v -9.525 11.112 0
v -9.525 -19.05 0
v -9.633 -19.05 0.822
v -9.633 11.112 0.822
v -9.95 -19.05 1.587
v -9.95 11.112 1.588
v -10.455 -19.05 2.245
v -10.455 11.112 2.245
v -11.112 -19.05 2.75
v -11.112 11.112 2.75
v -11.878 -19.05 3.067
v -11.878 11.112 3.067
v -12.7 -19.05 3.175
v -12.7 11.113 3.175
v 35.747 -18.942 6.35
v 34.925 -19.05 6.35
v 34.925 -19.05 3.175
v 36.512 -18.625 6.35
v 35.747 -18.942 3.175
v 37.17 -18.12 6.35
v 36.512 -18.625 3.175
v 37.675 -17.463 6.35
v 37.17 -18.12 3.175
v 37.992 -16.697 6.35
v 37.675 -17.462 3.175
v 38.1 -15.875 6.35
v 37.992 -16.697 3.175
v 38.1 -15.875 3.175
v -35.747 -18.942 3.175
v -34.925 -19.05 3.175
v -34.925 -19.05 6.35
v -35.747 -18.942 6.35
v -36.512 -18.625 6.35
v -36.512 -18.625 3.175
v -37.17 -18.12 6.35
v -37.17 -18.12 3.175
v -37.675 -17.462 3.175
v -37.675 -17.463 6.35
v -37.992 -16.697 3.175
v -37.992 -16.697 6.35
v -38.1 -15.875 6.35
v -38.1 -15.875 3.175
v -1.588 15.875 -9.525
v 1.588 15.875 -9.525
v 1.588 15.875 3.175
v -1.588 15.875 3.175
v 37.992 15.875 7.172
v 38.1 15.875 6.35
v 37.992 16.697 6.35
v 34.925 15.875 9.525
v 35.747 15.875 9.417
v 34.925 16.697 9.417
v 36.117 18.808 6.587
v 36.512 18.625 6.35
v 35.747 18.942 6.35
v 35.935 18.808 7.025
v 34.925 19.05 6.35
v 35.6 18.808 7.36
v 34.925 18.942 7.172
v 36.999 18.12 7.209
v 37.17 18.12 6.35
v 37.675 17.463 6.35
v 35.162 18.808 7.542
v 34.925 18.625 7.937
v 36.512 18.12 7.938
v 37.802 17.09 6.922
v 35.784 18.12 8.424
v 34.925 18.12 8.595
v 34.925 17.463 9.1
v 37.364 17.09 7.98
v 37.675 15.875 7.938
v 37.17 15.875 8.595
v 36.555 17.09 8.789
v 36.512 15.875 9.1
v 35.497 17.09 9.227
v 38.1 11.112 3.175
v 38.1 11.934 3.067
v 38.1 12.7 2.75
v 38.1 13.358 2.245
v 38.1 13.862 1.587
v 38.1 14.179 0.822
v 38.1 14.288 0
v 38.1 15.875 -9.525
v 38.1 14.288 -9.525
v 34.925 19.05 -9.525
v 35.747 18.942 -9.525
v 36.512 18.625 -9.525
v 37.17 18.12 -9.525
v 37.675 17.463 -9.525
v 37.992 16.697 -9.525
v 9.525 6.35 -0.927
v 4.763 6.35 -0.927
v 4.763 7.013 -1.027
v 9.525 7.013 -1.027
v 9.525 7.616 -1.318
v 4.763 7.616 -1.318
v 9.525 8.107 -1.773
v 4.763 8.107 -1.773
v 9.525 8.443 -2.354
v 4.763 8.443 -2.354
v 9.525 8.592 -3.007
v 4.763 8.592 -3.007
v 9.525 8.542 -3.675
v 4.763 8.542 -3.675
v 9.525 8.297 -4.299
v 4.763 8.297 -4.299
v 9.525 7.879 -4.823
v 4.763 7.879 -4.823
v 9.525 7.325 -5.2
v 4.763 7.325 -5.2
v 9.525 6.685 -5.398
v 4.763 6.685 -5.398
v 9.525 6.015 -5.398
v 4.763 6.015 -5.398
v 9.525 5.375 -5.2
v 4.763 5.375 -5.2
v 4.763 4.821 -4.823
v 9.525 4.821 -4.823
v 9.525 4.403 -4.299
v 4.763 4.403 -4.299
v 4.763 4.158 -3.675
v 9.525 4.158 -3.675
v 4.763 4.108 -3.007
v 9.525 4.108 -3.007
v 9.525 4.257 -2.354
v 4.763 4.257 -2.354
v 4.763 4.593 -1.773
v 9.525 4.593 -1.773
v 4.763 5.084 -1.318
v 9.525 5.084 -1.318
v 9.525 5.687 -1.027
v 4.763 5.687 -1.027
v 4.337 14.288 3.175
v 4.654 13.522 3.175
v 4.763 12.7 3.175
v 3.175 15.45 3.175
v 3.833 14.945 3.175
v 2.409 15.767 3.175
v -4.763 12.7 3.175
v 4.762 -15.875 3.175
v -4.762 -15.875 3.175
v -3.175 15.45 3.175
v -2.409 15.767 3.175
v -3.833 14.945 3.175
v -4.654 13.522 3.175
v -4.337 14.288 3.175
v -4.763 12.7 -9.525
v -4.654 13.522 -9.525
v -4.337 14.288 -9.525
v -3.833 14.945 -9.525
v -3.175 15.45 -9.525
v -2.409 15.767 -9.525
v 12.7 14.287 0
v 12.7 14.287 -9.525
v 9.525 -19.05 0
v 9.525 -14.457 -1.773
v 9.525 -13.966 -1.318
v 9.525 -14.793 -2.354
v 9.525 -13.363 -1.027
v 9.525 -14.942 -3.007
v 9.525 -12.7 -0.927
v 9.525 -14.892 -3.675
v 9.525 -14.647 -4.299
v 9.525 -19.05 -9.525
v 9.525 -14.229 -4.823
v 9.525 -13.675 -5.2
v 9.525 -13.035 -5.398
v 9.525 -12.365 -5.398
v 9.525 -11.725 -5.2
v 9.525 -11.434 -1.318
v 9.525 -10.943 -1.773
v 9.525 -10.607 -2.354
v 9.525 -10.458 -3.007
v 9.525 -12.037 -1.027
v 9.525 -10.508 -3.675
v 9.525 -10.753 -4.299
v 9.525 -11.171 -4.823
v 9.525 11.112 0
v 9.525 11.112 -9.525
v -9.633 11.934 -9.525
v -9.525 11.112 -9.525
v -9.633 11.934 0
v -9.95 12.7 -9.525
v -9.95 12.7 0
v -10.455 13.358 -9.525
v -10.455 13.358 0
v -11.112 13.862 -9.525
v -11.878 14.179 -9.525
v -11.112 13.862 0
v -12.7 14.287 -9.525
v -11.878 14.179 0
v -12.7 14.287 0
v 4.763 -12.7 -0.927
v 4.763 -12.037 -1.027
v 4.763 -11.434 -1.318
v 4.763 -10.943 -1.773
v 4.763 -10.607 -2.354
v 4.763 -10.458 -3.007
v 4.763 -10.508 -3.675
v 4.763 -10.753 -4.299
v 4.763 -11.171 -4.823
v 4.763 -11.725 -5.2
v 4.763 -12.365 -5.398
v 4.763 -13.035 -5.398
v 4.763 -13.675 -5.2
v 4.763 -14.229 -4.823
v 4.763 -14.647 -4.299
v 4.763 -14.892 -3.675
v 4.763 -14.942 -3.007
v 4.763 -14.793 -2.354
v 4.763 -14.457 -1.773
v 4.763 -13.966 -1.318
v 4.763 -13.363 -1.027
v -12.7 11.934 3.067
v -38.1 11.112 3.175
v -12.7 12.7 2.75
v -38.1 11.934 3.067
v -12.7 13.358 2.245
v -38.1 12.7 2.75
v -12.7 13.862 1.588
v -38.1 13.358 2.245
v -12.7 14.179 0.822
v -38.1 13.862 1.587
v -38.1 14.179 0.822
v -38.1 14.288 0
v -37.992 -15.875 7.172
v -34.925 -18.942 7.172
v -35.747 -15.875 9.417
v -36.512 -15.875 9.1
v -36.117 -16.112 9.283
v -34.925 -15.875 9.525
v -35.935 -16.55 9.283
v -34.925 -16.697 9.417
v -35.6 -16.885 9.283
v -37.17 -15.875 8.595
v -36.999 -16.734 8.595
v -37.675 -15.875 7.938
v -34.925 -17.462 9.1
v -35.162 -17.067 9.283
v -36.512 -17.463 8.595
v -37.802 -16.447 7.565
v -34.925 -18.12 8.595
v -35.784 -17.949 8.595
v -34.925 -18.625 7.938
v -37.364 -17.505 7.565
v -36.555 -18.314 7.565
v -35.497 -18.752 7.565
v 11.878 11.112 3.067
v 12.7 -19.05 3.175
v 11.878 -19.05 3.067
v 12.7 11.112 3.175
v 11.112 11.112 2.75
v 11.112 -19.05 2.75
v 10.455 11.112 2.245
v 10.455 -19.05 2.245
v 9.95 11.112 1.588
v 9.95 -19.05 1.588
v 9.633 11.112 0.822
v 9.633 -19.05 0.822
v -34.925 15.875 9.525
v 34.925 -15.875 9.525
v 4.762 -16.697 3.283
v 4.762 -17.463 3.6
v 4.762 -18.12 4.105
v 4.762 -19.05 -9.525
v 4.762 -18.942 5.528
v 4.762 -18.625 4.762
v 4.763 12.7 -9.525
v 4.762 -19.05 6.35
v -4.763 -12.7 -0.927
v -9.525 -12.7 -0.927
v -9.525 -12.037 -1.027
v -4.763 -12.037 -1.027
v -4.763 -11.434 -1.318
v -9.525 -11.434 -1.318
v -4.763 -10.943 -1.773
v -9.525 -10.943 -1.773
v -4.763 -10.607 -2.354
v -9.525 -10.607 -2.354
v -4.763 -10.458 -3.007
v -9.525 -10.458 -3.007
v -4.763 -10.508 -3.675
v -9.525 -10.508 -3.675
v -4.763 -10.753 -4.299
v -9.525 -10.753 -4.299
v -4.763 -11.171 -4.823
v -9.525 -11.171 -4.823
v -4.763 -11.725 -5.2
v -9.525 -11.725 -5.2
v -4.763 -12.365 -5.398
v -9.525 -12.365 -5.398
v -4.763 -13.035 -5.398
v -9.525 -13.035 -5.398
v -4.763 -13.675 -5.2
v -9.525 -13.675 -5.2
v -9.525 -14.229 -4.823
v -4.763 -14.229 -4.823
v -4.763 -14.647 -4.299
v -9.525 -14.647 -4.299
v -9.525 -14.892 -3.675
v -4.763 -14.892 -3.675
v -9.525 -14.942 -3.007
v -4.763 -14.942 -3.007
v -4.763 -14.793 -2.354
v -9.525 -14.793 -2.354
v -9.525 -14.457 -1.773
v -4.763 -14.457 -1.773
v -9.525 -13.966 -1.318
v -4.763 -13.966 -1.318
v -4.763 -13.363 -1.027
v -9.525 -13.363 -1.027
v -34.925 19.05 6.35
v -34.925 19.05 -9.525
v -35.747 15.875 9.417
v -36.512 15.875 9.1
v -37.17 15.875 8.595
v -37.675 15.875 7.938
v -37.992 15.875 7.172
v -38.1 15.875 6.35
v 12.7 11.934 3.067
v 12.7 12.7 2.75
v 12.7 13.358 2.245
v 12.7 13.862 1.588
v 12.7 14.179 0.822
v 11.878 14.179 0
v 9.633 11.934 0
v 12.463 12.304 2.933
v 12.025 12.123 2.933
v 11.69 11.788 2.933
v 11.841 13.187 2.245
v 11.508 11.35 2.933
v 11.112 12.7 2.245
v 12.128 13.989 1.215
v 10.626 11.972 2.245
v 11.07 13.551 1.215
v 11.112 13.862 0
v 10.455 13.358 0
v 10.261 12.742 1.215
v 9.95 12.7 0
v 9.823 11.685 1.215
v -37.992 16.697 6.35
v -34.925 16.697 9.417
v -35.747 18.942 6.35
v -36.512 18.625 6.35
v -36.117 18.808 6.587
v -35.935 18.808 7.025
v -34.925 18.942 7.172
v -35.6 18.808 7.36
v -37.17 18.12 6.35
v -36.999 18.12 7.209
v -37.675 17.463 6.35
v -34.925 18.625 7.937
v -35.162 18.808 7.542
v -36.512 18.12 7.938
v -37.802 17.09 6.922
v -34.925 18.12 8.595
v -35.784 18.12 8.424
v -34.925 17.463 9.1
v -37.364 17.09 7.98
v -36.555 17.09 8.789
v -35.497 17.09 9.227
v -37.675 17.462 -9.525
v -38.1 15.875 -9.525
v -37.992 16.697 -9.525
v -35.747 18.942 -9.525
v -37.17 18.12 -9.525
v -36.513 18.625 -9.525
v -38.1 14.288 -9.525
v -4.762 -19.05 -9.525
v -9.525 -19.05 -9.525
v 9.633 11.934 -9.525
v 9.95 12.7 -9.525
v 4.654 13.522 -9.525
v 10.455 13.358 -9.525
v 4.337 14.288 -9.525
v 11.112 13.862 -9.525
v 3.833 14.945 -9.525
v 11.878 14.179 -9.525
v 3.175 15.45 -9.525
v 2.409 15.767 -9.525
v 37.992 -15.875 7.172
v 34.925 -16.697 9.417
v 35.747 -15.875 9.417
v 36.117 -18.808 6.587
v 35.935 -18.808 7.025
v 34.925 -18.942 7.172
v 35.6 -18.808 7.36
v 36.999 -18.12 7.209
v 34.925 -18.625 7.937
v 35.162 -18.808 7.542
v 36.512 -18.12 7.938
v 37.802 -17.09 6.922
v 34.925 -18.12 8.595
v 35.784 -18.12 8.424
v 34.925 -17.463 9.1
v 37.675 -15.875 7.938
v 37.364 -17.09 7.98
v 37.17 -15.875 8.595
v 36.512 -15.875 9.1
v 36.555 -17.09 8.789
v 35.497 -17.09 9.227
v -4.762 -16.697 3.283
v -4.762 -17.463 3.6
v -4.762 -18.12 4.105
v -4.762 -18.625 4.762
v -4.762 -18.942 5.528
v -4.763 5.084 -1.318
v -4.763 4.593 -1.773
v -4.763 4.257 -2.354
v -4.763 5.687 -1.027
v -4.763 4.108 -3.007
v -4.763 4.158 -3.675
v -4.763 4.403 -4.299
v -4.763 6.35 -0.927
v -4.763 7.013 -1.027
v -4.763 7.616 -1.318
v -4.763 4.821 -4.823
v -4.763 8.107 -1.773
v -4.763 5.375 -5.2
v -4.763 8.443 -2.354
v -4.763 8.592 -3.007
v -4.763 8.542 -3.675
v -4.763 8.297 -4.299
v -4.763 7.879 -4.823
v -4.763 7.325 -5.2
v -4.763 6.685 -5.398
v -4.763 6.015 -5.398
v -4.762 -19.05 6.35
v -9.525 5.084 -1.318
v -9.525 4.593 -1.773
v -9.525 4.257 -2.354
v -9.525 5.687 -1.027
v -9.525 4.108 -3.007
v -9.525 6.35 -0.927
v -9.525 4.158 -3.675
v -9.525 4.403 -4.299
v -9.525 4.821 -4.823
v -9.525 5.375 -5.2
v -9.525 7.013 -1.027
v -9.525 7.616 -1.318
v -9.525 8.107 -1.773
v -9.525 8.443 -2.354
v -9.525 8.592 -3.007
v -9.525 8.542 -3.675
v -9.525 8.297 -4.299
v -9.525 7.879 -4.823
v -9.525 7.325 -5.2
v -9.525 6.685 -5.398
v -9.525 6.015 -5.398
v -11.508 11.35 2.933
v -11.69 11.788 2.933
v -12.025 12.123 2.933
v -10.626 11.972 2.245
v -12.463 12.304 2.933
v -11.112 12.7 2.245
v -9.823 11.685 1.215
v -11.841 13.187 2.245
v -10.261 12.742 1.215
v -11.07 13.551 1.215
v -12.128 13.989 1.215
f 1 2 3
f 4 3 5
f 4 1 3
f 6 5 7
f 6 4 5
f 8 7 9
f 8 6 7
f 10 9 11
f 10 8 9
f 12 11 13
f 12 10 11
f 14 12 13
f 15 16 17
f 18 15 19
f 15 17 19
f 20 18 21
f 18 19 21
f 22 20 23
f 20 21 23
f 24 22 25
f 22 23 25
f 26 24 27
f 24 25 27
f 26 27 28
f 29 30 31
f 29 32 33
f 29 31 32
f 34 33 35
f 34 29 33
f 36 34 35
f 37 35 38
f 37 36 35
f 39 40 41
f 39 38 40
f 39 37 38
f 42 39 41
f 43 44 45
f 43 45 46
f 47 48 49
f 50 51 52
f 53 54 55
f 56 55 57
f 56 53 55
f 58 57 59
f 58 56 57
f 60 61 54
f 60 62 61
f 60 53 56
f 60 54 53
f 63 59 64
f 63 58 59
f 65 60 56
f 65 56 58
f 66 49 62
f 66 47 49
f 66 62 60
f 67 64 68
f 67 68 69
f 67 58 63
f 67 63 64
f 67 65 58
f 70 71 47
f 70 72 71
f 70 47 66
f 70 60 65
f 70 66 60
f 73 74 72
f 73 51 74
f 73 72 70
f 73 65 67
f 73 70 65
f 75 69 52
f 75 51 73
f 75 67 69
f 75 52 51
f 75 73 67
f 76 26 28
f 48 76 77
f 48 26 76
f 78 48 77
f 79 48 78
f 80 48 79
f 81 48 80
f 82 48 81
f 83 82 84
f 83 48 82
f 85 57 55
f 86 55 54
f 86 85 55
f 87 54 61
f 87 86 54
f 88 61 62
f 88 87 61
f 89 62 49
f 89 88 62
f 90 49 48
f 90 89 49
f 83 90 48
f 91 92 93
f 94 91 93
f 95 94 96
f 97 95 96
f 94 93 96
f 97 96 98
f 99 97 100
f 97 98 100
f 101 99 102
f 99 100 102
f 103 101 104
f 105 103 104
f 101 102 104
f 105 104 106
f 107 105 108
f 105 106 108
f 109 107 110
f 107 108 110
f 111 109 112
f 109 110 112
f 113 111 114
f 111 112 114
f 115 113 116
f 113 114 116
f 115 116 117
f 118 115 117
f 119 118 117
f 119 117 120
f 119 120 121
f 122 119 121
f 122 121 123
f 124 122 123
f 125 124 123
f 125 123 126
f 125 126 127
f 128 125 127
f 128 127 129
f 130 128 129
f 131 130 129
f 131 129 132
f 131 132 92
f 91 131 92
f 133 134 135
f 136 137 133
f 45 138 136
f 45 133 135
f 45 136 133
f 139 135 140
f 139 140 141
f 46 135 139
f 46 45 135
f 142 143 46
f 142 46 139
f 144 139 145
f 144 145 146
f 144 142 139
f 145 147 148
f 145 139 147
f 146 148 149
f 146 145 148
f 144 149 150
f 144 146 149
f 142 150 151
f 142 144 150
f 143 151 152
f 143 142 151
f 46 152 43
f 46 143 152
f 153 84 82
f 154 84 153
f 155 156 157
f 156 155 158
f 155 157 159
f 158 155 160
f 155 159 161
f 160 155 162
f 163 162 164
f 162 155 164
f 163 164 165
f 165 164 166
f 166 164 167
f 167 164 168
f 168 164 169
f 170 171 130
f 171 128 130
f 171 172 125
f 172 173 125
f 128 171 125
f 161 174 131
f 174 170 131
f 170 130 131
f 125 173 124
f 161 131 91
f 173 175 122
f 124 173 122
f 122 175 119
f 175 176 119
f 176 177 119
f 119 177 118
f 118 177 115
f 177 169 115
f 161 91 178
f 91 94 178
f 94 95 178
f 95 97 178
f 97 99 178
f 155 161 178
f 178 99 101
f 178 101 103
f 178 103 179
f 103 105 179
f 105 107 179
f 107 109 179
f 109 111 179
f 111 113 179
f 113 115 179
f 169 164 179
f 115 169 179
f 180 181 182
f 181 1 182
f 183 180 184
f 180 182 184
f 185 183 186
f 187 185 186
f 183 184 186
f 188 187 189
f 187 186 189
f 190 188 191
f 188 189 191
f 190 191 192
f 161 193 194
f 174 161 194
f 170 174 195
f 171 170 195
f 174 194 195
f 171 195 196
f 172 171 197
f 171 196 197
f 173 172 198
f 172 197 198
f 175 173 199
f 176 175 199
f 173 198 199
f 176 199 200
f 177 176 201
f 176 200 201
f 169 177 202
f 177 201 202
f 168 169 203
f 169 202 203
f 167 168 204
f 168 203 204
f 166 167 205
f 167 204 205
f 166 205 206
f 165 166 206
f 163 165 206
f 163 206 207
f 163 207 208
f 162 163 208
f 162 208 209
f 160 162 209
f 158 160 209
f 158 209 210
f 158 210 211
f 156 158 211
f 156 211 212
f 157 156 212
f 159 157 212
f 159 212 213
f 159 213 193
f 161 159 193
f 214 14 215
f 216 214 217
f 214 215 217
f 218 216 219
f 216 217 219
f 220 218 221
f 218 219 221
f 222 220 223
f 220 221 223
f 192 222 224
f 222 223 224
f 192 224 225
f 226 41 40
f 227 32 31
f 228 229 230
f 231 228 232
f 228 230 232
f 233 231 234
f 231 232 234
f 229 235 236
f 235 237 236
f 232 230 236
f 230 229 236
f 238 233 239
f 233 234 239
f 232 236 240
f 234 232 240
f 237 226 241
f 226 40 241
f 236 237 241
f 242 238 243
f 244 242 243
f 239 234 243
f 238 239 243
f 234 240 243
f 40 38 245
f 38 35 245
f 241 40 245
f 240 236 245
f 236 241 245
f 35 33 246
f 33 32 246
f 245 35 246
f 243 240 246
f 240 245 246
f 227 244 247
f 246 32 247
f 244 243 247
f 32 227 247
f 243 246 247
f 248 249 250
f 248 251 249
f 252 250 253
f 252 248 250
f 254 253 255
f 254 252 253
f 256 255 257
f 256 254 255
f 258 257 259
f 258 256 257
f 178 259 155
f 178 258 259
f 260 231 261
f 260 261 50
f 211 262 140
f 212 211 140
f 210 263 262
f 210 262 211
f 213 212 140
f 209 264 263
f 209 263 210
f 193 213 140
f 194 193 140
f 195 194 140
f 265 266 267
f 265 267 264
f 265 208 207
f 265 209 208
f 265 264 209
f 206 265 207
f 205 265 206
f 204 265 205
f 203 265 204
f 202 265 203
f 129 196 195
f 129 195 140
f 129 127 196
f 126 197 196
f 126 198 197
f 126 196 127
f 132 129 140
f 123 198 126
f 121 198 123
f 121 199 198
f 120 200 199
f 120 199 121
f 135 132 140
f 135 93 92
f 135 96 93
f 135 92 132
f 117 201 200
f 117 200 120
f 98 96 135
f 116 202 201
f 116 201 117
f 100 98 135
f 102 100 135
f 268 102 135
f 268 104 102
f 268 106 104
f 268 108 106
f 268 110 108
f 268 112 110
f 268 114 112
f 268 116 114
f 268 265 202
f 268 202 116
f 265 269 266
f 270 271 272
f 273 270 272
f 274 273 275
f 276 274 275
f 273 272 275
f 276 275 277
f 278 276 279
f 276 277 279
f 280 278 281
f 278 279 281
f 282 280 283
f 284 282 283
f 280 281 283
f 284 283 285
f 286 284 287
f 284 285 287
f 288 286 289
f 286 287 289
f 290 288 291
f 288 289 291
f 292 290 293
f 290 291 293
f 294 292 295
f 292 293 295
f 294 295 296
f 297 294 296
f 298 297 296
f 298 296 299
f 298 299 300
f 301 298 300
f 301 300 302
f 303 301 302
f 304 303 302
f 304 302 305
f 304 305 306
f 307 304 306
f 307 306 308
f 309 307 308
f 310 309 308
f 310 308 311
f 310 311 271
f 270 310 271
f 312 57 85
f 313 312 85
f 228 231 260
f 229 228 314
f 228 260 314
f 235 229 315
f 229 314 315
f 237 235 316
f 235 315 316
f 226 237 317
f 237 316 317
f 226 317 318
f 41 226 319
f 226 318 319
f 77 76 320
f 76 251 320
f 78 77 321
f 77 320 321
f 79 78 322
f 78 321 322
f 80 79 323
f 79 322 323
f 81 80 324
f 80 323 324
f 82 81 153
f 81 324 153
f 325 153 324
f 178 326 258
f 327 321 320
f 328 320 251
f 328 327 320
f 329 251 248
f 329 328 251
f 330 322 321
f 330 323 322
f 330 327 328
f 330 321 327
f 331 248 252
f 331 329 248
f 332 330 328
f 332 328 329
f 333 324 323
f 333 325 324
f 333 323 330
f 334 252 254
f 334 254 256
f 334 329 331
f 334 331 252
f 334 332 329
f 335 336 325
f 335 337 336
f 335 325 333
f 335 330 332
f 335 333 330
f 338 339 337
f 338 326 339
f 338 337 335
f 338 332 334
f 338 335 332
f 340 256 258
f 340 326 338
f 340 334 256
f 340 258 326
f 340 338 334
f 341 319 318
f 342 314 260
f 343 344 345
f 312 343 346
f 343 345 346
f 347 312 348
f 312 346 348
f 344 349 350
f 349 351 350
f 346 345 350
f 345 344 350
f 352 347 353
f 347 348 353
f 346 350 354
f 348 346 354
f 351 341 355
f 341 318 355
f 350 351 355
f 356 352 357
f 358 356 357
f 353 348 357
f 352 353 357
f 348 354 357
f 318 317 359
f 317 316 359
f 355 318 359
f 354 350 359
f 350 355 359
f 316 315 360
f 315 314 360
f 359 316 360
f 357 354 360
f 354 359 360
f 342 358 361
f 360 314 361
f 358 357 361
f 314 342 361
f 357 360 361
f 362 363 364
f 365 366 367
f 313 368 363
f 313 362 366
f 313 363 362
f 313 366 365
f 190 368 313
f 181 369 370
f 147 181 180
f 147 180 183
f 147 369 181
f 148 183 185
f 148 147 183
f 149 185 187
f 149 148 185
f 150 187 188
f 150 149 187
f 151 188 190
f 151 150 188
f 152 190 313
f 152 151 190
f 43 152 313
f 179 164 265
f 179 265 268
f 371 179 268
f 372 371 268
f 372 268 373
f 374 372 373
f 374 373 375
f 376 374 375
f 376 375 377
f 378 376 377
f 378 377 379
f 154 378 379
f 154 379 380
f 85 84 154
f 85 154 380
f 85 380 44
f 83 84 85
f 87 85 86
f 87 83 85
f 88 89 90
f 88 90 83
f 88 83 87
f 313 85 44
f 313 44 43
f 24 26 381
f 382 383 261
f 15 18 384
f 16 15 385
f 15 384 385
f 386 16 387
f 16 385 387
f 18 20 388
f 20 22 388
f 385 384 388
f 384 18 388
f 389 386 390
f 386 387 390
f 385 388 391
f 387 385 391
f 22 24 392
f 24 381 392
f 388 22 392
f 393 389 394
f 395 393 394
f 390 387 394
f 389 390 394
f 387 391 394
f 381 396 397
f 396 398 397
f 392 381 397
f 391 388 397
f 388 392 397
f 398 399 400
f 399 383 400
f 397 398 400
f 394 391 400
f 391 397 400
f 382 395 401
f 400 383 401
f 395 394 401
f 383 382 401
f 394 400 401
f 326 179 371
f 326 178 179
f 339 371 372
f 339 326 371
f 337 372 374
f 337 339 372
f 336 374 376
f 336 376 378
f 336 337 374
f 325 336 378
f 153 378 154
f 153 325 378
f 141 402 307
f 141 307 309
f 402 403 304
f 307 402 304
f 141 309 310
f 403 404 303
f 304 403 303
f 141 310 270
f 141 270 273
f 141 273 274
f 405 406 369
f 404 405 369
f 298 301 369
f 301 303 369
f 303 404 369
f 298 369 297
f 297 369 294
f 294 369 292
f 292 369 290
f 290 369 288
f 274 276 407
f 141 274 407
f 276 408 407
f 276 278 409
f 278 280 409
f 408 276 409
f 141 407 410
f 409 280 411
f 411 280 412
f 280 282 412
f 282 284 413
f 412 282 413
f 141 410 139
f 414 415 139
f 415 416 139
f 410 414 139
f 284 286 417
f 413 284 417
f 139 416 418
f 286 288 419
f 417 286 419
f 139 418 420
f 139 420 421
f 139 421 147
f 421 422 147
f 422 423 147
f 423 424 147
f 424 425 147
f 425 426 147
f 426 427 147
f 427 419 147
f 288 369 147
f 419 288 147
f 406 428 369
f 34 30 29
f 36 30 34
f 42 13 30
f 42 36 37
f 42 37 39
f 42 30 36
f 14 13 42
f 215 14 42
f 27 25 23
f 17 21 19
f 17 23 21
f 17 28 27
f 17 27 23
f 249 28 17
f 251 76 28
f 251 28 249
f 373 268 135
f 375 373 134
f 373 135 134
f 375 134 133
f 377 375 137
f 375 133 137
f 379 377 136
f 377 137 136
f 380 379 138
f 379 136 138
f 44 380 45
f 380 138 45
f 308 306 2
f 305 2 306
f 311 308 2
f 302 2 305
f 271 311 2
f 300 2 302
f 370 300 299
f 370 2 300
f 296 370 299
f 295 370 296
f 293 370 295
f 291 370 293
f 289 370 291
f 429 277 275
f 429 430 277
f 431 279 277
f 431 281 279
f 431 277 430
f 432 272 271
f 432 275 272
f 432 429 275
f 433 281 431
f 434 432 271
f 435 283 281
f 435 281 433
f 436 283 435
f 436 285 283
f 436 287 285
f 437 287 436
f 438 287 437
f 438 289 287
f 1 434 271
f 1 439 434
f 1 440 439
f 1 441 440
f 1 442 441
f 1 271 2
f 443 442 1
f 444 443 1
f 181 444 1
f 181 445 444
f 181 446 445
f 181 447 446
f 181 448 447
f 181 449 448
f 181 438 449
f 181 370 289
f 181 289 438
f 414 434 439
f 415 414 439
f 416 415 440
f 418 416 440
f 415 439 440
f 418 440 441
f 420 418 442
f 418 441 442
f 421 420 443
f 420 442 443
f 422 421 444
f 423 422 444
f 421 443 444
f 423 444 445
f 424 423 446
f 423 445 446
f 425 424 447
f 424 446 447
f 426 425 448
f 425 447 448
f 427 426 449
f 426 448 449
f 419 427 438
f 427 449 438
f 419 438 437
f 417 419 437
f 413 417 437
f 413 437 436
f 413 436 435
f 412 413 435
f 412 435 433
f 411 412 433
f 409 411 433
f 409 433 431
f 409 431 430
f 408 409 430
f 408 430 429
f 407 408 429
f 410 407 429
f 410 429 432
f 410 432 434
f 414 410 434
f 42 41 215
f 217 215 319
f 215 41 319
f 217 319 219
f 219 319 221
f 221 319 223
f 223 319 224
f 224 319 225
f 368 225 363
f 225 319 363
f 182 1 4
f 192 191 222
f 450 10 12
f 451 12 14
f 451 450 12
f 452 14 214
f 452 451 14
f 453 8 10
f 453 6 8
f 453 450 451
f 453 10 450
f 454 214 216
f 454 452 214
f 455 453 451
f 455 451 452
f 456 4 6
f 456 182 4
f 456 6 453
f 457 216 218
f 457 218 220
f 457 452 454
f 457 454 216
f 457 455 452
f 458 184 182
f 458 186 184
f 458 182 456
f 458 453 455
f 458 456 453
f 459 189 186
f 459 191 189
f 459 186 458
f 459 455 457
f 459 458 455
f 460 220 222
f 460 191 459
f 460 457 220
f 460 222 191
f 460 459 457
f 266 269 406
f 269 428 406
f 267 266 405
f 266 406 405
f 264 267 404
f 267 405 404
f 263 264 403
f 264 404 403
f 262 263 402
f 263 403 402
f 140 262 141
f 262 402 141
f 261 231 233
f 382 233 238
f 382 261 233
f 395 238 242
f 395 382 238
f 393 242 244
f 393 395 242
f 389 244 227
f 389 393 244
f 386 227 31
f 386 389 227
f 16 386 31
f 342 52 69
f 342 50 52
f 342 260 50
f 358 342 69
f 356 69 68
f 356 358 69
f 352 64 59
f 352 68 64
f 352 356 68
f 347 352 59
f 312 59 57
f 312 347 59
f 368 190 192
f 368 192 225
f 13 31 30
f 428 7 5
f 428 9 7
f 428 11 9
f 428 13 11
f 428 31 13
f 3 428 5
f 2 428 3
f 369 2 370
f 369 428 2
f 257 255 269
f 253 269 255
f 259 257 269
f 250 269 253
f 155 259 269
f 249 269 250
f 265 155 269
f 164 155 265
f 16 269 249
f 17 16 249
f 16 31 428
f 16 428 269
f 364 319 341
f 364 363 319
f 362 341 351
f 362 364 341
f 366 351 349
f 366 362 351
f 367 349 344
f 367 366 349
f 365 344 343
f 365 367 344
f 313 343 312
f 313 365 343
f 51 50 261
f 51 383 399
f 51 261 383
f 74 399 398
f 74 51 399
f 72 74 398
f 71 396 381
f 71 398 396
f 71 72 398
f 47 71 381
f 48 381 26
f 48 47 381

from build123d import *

# Parameters (mm, degrees)
SKETCH1_W             = 19.05
SKETCH1_H             = 38.1
BOSS_EXTRUDE1_DEPTH   = 38.1
SKETCH2_W             = 9.525
SKETCH2_H             = 34.925
CUT_EXTRUDE1_DEPTH    = 12.7
SKETCH3_W             = 28.575
SKETCH3_H             = 33.3375
CUT_EXTRUDE2_DEPTH    = 12.7
FILLET1_R             = 3.175
F_8_CLEARANCE_HOLE1_D = 4.4958
FILLET2_R             = 3.175


with BuildPart() as part:
    # Sketch1 → Boss-Extrude1 (new, symmetric)
    with BuildSketch(Plane(origin=(0, 0, 0), x_dir=(0, 0, -1), z_dir=(1, 0, 0))):
        Rectangle(SKETCH1_W, SKETCH1_H)
    extrude(amount=BOSS_EXTRUDE1_DEPTH, both=True)

    # Sketch2 → Cut-Extrude1 (cut)
    with BuildSketch(Plane(origin=(0, 0, -9.525), x_dir=(-1, 0, 0), z_dir=(0, 0, -1))):
        with Locations((0, -1.5875)):
            Rectangle(SKETCH2_W, SKETCH2_H)
    extrude(amount=-CUT_EXTRUDE1_DEPTH, mode=Mode.SUBTRACT)

    # Sketch3 → Cut-Extrude2 (cut)
    with BuildSketch(Plane(origin=(0, 0, -9.525), x_dir=(-1, 0, 0), z_dir=(0, 0, -1))):
        with Locations((-23.8125, -2.38125)):
            Rectangle(SKETCH3_W, SKETCH3_H)
        with Locations((23.8125, -2.38125)):
            Rectangle(SKETCH3_W, SKETCH3_H)
    extrude(amount=-CUT_EXTRUDE2_DEPTH, mode=Mode.SUBTRACT)

    # Fillet1
    fillet1_edges = [part.edges().sort_by_distance(p)[0] for p in [
        (38.1, 0, 9.525),
        (38.1, -19.05, 6.35),
        (4.7625, 15.875, -3.175),
        (-4.7625, 15.875, -3.175),
        (9.525, 14.2875, -3.175),
        (23.8125, 14.2875, 3.175),
        (9.525, -2.38125, 3.175),
        (-9.525, 14.2875, -3.175),
        (-9.525, -2.38125, 3.175),
        (-23.8125, 14.2875, 3.175),
        (-38.1, -19.05, 6.35),
        (-38.1, 0, 9.525),
        (-38.1, 19.05, 0),
        (38.1, 19.05, 0),
        (0, -19.05, 9.525),
        (0, 19.05, 9.525),
    ]]
    fillet(fillet1_edges, radius=FILLET1_R)

    # #8 Clearance Hole1 (through all)
    with Locations(Plane(origin=(9.525, 0, 0), x_dir=(0, 0, -1), z_dir=(1, 0, 0))):
        with Locations((3.175, -12.7), (3.175, 6.35)):
            Hole(F_8_CLEARANCE_HOLE1_D / 2)

    # Fillet2
    fillet2_edges = [part.edges().sort_by_distance(p)[0] for p in [
        (0, -19.05, 3.175),
    ]]
    fillet(fillet2_edges, radius=FILLET2_R - 0.0001)  # a hair under: the kernel refuses the full size


solid = part.part
